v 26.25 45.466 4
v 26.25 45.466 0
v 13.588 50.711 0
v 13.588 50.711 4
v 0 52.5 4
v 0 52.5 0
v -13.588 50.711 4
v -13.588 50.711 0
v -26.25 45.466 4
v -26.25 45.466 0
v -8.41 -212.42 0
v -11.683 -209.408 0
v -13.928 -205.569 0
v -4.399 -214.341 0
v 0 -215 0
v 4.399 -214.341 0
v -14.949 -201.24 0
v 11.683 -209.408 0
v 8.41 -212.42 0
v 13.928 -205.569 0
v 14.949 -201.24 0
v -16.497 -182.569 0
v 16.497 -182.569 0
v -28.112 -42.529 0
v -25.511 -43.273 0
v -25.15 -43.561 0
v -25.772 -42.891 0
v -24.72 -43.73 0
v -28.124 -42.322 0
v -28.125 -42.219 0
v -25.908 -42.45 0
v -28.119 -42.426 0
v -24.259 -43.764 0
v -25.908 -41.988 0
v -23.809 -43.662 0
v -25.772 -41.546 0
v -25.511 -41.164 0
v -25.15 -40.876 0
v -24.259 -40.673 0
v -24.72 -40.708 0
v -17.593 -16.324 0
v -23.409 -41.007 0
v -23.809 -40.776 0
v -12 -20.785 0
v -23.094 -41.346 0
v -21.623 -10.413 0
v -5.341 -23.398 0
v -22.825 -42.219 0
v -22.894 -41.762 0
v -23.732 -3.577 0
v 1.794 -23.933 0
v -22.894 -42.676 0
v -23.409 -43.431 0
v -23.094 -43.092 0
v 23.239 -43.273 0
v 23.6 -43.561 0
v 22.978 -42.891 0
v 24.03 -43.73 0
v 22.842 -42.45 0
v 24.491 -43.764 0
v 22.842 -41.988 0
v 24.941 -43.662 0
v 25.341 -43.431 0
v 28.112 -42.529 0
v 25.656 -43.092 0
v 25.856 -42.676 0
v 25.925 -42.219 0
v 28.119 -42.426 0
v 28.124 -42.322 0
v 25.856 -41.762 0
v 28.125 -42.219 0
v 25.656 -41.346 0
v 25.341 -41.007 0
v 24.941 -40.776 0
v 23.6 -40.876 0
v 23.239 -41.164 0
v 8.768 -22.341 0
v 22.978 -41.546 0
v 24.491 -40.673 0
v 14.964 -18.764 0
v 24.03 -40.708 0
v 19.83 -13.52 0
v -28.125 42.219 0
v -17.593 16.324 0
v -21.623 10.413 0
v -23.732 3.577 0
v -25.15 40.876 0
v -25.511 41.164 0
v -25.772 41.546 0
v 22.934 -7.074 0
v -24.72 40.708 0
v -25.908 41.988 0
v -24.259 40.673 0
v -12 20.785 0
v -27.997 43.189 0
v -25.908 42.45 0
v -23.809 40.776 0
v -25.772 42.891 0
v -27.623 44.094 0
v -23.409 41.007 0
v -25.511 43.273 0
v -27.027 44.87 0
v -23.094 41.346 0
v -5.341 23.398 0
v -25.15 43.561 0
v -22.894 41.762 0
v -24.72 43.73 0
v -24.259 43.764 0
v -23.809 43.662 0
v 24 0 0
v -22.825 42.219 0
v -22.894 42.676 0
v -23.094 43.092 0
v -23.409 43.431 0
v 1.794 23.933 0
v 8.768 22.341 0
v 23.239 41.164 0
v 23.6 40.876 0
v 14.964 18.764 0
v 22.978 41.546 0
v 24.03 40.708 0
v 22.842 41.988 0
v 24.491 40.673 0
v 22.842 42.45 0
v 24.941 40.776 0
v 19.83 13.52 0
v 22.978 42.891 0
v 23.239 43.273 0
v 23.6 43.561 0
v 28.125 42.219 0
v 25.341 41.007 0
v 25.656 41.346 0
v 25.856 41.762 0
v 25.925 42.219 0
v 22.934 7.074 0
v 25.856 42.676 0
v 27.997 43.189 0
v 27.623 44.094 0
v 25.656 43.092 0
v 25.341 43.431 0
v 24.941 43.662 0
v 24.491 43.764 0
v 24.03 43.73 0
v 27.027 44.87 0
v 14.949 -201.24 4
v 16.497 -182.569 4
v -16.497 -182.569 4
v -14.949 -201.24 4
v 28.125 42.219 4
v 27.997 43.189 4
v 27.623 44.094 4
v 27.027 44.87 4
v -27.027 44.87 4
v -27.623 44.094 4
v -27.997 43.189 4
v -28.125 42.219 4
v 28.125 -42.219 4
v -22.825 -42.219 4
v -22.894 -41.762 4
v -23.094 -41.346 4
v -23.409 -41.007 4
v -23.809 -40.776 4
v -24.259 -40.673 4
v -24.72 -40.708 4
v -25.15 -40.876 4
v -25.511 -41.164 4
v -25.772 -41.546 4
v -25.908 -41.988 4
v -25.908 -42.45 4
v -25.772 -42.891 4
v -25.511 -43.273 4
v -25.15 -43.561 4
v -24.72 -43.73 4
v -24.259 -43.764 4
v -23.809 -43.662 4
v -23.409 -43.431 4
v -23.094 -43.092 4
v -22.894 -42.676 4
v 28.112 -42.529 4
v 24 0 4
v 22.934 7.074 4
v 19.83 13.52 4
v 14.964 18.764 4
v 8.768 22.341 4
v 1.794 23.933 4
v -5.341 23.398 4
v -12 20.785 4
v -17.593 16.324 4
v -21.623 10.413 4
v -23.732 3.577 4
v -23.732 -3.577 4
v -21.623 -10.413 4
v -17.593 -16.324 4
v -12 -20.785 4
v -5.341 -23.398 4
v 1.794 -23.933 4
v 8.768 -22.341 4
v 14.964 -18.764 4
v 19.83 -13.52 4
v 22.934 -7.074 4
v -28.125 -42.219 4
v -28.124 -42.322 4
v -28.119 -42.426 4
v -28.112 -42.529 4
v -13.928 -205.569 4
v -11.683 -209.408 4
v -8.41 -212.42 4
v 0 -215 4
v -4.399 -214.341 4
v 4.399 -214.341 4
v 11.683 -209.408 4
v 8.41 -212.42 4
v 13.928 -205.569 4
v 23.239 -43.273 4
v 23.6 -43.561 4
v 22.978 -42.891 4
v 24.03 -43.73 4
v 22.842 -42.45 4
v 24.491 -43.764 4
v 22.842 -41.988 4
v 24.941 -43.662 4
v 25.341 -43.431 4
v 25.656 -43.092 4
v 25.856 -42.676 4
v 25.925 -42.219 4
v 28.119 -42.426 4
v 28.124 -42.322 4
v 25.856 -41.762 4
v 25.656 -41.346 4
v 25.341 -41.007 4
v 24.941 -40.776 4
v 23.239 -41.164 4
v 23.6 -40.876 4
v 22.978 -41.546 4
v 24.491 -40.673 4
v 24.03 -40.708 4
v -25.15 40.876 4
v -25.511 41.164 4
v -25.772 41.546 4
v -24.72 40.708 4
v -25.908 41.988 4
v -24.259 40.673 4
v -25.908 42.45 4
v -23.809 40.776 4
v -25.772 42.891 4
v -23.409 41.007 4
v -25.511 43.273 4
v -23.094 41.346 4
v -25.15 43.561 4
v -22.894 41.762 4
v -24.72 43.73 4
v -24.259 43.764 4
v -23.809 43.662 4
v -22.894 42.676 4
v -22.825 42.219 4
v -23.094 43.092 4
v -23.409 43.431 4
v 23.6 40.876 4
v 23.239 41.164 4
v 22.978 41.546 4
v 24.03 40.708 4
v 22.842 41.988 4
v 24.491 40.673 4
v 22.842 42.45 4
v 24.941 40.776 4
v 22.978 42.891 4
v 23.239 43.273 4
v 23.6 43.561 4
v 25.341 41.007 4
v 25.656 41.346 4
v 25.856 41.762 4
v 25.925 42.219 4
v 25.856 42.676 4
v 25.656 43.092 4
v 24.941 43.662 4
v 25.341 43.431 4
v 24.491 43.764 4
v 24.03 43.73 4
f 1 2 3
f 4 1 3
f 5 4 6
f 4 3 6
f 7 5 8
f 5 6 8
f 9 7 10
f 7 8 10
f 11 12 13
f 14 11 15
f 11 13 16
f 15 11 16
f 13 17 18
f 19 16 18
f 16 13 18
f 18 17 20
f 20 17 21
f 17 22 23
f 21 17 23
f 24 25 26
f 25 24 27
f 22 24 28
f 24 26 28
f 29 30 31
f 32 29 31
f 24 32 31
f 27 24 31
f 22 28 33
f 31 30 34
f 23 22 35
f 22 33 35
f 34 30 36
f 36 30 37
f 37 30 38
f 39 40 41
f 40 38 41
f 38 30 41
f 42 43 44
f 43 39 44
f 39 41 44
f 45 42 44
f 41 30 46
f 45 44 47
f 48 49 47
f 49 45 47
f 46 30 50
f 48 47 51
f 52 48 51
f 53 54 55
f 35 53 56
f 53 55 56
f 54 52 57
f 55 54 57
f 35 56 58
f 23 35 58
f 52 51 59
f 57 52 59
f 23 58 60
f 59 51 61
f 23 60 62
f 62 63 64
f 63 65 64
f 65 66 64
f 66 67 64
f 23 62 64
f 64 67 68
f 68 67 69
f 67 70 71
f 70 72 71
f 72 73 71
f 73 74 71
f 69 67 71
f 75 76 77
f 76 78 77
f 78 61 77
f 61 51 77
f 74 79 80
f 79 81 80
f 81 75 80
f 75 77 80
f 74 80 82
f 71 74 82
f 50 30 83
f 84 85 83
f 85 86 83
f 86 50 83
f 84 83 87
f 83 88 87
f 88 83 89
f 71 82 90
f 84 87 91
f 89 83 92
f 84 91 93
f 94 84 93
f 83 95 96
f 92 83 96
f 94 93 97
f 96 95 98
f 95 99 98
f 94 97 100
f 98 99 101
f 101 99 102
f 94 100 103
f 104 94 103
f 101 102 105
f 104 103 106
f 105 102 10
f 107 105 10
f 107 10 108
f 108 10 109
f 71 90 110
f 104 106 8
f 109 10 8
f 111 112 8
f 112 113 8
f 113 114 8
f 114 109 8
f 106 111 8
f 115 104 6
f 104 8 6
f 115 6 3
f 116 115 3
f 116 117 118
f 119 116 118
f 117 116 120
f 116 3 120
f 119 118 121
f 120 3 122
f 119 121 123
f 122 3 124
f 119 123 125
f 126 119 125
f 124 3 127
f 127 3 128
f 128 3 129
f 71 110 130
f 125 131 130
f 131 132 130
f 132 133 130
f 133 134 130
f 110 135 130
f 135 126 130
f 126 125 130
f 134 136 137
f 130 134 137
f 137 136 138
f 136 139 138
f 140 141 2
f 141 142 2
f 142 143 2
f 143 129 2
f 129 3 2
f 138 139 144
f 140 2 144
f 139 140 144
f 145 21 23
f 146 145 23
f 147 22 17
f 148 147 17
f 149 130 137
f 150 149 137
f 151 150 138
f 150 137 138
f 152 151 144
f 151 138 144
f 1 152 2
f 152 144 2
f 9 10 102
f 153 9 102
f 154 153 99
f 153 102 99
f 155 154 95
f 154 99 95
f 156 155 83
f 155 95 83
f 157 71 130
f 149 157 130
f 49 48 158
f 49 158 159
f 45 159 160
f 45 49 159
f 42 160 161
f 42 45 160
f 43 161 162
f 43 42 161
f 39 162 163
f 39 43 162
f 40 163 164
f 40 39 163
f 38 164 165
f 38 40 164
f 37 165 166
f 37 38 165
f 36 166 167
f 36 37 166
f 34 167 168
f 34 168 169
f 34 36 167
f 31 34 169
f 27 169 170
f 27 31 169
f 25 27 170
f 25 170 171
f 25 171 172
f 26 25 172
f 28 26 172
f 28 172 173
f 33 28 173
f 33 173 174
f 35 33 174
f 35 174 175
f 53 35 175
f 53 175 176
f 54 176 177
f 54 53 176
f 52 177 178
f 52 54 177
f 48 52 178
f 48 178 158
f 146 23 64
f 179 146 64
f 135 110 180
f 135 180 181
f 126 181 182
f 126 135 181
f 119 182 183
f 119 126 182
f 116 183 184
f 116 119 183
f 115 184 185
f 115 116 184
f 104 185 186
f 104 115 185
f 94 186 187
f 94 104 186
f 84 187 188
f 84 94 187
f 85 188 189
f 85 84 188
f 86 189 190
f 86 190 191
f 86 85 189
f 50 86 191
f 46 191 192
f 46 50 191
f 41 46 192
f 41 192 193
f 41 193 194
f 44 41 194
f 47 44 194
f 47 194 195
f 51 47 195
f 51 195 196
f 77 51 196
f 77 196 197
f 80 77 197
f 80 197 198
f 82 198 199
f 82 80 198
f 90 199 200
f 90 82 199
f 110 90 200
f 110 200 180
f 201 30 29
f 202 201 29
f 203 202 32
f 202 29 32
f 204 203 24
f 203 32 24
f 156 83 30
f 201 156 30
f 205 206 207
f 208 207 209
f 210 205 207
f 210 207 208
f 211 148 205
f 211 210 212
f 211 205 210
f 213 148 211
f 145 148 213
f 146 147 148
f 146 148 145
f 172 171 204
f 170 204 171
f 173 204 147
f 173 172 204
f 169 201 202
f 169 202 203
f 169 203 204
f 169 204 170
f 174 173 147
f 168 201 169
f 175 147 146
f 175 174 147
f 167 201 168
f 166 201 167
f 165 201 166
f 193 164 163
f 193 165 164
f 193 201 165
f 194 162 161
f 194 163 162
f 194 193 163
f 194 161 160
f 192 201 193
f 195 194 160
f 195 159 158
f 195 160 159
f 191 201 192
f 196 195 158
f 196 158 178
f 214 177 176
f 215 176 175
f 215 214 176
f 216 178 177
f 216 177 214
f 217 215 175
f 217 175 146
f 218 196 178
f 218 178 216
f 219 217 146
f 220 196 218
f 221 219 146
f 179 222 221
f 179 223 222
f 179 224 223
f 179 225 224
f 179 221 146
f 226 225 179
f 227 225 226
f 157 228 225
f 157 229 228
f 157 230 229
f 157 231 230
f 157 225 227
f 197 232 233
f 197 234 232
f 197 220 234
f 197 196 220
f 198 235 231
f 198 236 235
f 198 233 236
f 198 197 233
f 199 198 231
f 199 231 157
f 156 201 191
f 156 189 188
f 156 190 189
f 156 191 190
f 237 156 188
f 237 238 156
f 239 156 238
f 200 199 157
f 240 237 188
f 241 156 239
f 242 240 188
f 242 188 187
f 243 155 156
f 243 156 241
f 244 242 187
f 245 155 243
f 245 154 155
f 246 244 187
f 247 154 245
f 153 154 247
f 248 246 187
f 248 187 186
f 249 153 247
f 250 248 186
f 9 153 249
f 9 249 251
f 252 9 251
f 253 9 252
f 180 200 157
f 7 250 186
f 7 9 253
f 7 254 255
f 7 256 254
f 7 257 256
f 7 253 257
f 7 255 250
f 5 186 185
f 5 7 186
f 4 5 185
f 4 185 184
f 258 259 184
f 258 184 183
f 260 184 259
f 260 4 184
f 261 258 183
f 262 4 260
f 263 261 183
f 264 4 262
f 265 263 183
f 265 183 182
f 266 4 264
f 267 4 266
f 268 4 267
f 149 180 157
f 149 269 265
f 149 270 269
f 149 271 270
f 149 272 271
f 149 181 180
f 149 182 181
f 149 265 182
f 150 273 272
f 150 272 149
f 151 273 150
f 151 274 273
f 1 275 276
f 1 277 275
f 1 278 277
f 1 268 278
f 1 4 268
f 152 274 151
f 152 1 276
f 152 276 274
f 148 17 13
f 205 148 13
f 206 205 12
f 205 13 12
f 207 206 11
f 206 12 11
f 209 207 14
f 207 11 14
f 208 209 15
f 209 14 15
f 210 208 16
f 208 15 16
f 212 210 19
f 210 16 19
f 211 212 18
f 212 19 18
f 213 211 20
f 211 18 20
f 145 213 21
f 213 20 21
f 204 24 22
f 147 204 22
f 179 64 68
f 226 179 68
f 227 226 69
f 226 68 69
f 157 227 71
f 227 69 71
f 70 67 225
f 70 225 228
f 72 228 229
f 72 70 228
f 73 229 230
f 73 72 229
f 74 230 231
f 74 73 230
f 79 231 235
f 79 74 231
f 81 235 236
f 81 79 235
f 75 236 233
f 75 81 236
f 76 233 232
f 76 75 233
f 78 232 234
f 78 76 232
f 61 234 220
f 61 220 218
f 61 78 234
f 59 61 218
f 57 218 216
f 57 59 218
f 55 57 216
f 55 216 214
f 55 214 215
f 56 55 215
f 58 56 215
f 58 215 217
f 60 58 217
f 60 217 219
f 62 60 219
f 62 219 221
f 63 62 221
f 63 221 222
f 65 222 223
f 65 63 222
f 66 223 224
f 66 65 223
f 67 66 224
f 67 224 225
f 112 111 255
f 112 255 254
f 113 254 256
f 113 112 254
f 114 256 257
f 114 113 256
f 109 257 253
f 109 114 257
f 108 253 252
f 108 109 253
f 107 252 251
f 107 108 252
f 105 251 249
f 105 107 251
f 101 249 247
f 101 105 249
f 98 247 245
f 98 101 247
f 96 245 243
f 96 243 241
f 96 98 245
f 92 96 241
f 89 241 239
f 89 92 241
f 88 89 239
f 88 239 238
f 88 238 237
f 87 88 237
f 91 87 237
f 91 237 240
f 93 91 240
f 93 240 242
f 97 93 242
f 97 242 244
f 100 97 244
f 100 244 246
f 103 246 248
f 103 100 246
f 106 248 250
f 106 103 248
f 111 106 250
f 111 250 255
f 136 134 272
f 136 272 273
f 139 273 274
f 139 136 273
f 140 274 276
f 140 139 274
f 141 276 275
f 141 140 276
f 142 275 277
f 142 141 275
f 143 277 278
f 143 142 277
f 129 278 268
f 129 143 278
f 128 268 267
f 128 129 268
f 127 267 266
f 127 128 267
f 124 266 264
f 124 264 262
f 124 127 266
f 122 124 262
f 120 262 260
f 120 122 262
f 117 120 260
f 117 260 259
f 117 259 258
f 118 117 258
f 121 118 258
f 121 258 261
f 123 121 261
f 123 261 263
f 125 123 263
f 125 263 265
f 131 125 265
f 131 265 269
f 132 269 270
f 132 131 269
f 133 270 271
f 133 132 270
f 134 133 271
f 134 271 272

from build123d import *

# Parameters (mm, degrees)
SKETCH1_R           = 1.55
SKETCH1_R_2         = 24
BOSS_EXTRUDE1_DEPTH = 4
BOSS_EXTRUDE2_DEPTH = 4


with BuildPart() as part:
    # Sketch1 → Boss-Extrude1 (new body)
    with BuildSketch(Plane.XY):
        with BuildLine():
            ThreePointArc((-26.25, 45.466333699), (-27.622595264, 44.093738434), (-28.125, 42.218738434))
            Line((-28.125, 42.218738434), (-28.125, -42.218738434))
            ThreePointArc((-28.125, -42.218738434), (-28.12179062, -42.373851469), (-28.112167971, -42.528699002))
            ThreePointArc((-28.112167971, -42.528699002), (-27.542259342, -44.226465573), (-26.25, -45.466333699))
            ThreePointArc((-26.25, -45.466333699), (0, -52.5), (26.25, -45.466333699))
            ThreePointArc((26.25, -45.466333699), (27.542259342, -44.226465573), (28.112167971, -42.528699002))
            ThreePointArc((28.112167971, -42.528699002), (28.12179062, -42.373851469), (28.125, -42.218738434))
            Line((28.125, -42.218738434), (28.125, 42.218738434))
            ThreePointArc((28.125, 42.218738434), (27.622595264, 44.093738434), (26.25, 45.466333699))
            ThreePointArc((26.25, 45.466333699), (0, 52.5), (-26.25, 45.466333699))
        make_face()
        with Locations((-24.375, -42.218738434)):
            Circle(SKETCH1_R, mode=Mode.SUBTRACT)
        with Locations((-24.375, 42.218738434)):
            Circle(SKETCH1_R, mode=Mode.SUBTRACT)
        Circle(SKETCH1_R_2, mode=Mode.SUBTRACT)
        with Locations((24.375, -42.218738434)):
            Circle(SKETCH1_R, mode=Mode.SUBTRACT)
        with Locations((24.375, 42.218738434)):
            Circle(SKETCH1_R, mode=Mode.SUBTRACT)
    extrude(amount=BOSS_EXTRUDE1_DEPTH)

    # Sketch1<4> → Boss-Extrude2 (add)
    with BuildSketch(Plane.XY):
        with BuildLine():
            ThreePointArc((-26.25, -45.466333699), (-27.542259342, -44.226465573), (-28.112167971, -42.528699002))
            Line((-28.112167971, -42.528699002), (-14.948671886, -201.239842268))
            ThreePointArc((-14.948671886, -201.239842268), (0, -215), (14.948671886, -201.239842268))
            Line((14.948671886, -201.239842268), (28.112167971, -42.528699002))
            ThreePointArc((28.112167971, -42.528699002), (27.542259342, -44.226465573), (26.25, -45.466333699))
            ThreePointArc((26.25, -45.466333699), (0, -52.5), (-26.25, -45.466333699))
        make_face()
    extrude(amount=BOSS_EXTRUDE2_DEPTH)


solid = part.part
